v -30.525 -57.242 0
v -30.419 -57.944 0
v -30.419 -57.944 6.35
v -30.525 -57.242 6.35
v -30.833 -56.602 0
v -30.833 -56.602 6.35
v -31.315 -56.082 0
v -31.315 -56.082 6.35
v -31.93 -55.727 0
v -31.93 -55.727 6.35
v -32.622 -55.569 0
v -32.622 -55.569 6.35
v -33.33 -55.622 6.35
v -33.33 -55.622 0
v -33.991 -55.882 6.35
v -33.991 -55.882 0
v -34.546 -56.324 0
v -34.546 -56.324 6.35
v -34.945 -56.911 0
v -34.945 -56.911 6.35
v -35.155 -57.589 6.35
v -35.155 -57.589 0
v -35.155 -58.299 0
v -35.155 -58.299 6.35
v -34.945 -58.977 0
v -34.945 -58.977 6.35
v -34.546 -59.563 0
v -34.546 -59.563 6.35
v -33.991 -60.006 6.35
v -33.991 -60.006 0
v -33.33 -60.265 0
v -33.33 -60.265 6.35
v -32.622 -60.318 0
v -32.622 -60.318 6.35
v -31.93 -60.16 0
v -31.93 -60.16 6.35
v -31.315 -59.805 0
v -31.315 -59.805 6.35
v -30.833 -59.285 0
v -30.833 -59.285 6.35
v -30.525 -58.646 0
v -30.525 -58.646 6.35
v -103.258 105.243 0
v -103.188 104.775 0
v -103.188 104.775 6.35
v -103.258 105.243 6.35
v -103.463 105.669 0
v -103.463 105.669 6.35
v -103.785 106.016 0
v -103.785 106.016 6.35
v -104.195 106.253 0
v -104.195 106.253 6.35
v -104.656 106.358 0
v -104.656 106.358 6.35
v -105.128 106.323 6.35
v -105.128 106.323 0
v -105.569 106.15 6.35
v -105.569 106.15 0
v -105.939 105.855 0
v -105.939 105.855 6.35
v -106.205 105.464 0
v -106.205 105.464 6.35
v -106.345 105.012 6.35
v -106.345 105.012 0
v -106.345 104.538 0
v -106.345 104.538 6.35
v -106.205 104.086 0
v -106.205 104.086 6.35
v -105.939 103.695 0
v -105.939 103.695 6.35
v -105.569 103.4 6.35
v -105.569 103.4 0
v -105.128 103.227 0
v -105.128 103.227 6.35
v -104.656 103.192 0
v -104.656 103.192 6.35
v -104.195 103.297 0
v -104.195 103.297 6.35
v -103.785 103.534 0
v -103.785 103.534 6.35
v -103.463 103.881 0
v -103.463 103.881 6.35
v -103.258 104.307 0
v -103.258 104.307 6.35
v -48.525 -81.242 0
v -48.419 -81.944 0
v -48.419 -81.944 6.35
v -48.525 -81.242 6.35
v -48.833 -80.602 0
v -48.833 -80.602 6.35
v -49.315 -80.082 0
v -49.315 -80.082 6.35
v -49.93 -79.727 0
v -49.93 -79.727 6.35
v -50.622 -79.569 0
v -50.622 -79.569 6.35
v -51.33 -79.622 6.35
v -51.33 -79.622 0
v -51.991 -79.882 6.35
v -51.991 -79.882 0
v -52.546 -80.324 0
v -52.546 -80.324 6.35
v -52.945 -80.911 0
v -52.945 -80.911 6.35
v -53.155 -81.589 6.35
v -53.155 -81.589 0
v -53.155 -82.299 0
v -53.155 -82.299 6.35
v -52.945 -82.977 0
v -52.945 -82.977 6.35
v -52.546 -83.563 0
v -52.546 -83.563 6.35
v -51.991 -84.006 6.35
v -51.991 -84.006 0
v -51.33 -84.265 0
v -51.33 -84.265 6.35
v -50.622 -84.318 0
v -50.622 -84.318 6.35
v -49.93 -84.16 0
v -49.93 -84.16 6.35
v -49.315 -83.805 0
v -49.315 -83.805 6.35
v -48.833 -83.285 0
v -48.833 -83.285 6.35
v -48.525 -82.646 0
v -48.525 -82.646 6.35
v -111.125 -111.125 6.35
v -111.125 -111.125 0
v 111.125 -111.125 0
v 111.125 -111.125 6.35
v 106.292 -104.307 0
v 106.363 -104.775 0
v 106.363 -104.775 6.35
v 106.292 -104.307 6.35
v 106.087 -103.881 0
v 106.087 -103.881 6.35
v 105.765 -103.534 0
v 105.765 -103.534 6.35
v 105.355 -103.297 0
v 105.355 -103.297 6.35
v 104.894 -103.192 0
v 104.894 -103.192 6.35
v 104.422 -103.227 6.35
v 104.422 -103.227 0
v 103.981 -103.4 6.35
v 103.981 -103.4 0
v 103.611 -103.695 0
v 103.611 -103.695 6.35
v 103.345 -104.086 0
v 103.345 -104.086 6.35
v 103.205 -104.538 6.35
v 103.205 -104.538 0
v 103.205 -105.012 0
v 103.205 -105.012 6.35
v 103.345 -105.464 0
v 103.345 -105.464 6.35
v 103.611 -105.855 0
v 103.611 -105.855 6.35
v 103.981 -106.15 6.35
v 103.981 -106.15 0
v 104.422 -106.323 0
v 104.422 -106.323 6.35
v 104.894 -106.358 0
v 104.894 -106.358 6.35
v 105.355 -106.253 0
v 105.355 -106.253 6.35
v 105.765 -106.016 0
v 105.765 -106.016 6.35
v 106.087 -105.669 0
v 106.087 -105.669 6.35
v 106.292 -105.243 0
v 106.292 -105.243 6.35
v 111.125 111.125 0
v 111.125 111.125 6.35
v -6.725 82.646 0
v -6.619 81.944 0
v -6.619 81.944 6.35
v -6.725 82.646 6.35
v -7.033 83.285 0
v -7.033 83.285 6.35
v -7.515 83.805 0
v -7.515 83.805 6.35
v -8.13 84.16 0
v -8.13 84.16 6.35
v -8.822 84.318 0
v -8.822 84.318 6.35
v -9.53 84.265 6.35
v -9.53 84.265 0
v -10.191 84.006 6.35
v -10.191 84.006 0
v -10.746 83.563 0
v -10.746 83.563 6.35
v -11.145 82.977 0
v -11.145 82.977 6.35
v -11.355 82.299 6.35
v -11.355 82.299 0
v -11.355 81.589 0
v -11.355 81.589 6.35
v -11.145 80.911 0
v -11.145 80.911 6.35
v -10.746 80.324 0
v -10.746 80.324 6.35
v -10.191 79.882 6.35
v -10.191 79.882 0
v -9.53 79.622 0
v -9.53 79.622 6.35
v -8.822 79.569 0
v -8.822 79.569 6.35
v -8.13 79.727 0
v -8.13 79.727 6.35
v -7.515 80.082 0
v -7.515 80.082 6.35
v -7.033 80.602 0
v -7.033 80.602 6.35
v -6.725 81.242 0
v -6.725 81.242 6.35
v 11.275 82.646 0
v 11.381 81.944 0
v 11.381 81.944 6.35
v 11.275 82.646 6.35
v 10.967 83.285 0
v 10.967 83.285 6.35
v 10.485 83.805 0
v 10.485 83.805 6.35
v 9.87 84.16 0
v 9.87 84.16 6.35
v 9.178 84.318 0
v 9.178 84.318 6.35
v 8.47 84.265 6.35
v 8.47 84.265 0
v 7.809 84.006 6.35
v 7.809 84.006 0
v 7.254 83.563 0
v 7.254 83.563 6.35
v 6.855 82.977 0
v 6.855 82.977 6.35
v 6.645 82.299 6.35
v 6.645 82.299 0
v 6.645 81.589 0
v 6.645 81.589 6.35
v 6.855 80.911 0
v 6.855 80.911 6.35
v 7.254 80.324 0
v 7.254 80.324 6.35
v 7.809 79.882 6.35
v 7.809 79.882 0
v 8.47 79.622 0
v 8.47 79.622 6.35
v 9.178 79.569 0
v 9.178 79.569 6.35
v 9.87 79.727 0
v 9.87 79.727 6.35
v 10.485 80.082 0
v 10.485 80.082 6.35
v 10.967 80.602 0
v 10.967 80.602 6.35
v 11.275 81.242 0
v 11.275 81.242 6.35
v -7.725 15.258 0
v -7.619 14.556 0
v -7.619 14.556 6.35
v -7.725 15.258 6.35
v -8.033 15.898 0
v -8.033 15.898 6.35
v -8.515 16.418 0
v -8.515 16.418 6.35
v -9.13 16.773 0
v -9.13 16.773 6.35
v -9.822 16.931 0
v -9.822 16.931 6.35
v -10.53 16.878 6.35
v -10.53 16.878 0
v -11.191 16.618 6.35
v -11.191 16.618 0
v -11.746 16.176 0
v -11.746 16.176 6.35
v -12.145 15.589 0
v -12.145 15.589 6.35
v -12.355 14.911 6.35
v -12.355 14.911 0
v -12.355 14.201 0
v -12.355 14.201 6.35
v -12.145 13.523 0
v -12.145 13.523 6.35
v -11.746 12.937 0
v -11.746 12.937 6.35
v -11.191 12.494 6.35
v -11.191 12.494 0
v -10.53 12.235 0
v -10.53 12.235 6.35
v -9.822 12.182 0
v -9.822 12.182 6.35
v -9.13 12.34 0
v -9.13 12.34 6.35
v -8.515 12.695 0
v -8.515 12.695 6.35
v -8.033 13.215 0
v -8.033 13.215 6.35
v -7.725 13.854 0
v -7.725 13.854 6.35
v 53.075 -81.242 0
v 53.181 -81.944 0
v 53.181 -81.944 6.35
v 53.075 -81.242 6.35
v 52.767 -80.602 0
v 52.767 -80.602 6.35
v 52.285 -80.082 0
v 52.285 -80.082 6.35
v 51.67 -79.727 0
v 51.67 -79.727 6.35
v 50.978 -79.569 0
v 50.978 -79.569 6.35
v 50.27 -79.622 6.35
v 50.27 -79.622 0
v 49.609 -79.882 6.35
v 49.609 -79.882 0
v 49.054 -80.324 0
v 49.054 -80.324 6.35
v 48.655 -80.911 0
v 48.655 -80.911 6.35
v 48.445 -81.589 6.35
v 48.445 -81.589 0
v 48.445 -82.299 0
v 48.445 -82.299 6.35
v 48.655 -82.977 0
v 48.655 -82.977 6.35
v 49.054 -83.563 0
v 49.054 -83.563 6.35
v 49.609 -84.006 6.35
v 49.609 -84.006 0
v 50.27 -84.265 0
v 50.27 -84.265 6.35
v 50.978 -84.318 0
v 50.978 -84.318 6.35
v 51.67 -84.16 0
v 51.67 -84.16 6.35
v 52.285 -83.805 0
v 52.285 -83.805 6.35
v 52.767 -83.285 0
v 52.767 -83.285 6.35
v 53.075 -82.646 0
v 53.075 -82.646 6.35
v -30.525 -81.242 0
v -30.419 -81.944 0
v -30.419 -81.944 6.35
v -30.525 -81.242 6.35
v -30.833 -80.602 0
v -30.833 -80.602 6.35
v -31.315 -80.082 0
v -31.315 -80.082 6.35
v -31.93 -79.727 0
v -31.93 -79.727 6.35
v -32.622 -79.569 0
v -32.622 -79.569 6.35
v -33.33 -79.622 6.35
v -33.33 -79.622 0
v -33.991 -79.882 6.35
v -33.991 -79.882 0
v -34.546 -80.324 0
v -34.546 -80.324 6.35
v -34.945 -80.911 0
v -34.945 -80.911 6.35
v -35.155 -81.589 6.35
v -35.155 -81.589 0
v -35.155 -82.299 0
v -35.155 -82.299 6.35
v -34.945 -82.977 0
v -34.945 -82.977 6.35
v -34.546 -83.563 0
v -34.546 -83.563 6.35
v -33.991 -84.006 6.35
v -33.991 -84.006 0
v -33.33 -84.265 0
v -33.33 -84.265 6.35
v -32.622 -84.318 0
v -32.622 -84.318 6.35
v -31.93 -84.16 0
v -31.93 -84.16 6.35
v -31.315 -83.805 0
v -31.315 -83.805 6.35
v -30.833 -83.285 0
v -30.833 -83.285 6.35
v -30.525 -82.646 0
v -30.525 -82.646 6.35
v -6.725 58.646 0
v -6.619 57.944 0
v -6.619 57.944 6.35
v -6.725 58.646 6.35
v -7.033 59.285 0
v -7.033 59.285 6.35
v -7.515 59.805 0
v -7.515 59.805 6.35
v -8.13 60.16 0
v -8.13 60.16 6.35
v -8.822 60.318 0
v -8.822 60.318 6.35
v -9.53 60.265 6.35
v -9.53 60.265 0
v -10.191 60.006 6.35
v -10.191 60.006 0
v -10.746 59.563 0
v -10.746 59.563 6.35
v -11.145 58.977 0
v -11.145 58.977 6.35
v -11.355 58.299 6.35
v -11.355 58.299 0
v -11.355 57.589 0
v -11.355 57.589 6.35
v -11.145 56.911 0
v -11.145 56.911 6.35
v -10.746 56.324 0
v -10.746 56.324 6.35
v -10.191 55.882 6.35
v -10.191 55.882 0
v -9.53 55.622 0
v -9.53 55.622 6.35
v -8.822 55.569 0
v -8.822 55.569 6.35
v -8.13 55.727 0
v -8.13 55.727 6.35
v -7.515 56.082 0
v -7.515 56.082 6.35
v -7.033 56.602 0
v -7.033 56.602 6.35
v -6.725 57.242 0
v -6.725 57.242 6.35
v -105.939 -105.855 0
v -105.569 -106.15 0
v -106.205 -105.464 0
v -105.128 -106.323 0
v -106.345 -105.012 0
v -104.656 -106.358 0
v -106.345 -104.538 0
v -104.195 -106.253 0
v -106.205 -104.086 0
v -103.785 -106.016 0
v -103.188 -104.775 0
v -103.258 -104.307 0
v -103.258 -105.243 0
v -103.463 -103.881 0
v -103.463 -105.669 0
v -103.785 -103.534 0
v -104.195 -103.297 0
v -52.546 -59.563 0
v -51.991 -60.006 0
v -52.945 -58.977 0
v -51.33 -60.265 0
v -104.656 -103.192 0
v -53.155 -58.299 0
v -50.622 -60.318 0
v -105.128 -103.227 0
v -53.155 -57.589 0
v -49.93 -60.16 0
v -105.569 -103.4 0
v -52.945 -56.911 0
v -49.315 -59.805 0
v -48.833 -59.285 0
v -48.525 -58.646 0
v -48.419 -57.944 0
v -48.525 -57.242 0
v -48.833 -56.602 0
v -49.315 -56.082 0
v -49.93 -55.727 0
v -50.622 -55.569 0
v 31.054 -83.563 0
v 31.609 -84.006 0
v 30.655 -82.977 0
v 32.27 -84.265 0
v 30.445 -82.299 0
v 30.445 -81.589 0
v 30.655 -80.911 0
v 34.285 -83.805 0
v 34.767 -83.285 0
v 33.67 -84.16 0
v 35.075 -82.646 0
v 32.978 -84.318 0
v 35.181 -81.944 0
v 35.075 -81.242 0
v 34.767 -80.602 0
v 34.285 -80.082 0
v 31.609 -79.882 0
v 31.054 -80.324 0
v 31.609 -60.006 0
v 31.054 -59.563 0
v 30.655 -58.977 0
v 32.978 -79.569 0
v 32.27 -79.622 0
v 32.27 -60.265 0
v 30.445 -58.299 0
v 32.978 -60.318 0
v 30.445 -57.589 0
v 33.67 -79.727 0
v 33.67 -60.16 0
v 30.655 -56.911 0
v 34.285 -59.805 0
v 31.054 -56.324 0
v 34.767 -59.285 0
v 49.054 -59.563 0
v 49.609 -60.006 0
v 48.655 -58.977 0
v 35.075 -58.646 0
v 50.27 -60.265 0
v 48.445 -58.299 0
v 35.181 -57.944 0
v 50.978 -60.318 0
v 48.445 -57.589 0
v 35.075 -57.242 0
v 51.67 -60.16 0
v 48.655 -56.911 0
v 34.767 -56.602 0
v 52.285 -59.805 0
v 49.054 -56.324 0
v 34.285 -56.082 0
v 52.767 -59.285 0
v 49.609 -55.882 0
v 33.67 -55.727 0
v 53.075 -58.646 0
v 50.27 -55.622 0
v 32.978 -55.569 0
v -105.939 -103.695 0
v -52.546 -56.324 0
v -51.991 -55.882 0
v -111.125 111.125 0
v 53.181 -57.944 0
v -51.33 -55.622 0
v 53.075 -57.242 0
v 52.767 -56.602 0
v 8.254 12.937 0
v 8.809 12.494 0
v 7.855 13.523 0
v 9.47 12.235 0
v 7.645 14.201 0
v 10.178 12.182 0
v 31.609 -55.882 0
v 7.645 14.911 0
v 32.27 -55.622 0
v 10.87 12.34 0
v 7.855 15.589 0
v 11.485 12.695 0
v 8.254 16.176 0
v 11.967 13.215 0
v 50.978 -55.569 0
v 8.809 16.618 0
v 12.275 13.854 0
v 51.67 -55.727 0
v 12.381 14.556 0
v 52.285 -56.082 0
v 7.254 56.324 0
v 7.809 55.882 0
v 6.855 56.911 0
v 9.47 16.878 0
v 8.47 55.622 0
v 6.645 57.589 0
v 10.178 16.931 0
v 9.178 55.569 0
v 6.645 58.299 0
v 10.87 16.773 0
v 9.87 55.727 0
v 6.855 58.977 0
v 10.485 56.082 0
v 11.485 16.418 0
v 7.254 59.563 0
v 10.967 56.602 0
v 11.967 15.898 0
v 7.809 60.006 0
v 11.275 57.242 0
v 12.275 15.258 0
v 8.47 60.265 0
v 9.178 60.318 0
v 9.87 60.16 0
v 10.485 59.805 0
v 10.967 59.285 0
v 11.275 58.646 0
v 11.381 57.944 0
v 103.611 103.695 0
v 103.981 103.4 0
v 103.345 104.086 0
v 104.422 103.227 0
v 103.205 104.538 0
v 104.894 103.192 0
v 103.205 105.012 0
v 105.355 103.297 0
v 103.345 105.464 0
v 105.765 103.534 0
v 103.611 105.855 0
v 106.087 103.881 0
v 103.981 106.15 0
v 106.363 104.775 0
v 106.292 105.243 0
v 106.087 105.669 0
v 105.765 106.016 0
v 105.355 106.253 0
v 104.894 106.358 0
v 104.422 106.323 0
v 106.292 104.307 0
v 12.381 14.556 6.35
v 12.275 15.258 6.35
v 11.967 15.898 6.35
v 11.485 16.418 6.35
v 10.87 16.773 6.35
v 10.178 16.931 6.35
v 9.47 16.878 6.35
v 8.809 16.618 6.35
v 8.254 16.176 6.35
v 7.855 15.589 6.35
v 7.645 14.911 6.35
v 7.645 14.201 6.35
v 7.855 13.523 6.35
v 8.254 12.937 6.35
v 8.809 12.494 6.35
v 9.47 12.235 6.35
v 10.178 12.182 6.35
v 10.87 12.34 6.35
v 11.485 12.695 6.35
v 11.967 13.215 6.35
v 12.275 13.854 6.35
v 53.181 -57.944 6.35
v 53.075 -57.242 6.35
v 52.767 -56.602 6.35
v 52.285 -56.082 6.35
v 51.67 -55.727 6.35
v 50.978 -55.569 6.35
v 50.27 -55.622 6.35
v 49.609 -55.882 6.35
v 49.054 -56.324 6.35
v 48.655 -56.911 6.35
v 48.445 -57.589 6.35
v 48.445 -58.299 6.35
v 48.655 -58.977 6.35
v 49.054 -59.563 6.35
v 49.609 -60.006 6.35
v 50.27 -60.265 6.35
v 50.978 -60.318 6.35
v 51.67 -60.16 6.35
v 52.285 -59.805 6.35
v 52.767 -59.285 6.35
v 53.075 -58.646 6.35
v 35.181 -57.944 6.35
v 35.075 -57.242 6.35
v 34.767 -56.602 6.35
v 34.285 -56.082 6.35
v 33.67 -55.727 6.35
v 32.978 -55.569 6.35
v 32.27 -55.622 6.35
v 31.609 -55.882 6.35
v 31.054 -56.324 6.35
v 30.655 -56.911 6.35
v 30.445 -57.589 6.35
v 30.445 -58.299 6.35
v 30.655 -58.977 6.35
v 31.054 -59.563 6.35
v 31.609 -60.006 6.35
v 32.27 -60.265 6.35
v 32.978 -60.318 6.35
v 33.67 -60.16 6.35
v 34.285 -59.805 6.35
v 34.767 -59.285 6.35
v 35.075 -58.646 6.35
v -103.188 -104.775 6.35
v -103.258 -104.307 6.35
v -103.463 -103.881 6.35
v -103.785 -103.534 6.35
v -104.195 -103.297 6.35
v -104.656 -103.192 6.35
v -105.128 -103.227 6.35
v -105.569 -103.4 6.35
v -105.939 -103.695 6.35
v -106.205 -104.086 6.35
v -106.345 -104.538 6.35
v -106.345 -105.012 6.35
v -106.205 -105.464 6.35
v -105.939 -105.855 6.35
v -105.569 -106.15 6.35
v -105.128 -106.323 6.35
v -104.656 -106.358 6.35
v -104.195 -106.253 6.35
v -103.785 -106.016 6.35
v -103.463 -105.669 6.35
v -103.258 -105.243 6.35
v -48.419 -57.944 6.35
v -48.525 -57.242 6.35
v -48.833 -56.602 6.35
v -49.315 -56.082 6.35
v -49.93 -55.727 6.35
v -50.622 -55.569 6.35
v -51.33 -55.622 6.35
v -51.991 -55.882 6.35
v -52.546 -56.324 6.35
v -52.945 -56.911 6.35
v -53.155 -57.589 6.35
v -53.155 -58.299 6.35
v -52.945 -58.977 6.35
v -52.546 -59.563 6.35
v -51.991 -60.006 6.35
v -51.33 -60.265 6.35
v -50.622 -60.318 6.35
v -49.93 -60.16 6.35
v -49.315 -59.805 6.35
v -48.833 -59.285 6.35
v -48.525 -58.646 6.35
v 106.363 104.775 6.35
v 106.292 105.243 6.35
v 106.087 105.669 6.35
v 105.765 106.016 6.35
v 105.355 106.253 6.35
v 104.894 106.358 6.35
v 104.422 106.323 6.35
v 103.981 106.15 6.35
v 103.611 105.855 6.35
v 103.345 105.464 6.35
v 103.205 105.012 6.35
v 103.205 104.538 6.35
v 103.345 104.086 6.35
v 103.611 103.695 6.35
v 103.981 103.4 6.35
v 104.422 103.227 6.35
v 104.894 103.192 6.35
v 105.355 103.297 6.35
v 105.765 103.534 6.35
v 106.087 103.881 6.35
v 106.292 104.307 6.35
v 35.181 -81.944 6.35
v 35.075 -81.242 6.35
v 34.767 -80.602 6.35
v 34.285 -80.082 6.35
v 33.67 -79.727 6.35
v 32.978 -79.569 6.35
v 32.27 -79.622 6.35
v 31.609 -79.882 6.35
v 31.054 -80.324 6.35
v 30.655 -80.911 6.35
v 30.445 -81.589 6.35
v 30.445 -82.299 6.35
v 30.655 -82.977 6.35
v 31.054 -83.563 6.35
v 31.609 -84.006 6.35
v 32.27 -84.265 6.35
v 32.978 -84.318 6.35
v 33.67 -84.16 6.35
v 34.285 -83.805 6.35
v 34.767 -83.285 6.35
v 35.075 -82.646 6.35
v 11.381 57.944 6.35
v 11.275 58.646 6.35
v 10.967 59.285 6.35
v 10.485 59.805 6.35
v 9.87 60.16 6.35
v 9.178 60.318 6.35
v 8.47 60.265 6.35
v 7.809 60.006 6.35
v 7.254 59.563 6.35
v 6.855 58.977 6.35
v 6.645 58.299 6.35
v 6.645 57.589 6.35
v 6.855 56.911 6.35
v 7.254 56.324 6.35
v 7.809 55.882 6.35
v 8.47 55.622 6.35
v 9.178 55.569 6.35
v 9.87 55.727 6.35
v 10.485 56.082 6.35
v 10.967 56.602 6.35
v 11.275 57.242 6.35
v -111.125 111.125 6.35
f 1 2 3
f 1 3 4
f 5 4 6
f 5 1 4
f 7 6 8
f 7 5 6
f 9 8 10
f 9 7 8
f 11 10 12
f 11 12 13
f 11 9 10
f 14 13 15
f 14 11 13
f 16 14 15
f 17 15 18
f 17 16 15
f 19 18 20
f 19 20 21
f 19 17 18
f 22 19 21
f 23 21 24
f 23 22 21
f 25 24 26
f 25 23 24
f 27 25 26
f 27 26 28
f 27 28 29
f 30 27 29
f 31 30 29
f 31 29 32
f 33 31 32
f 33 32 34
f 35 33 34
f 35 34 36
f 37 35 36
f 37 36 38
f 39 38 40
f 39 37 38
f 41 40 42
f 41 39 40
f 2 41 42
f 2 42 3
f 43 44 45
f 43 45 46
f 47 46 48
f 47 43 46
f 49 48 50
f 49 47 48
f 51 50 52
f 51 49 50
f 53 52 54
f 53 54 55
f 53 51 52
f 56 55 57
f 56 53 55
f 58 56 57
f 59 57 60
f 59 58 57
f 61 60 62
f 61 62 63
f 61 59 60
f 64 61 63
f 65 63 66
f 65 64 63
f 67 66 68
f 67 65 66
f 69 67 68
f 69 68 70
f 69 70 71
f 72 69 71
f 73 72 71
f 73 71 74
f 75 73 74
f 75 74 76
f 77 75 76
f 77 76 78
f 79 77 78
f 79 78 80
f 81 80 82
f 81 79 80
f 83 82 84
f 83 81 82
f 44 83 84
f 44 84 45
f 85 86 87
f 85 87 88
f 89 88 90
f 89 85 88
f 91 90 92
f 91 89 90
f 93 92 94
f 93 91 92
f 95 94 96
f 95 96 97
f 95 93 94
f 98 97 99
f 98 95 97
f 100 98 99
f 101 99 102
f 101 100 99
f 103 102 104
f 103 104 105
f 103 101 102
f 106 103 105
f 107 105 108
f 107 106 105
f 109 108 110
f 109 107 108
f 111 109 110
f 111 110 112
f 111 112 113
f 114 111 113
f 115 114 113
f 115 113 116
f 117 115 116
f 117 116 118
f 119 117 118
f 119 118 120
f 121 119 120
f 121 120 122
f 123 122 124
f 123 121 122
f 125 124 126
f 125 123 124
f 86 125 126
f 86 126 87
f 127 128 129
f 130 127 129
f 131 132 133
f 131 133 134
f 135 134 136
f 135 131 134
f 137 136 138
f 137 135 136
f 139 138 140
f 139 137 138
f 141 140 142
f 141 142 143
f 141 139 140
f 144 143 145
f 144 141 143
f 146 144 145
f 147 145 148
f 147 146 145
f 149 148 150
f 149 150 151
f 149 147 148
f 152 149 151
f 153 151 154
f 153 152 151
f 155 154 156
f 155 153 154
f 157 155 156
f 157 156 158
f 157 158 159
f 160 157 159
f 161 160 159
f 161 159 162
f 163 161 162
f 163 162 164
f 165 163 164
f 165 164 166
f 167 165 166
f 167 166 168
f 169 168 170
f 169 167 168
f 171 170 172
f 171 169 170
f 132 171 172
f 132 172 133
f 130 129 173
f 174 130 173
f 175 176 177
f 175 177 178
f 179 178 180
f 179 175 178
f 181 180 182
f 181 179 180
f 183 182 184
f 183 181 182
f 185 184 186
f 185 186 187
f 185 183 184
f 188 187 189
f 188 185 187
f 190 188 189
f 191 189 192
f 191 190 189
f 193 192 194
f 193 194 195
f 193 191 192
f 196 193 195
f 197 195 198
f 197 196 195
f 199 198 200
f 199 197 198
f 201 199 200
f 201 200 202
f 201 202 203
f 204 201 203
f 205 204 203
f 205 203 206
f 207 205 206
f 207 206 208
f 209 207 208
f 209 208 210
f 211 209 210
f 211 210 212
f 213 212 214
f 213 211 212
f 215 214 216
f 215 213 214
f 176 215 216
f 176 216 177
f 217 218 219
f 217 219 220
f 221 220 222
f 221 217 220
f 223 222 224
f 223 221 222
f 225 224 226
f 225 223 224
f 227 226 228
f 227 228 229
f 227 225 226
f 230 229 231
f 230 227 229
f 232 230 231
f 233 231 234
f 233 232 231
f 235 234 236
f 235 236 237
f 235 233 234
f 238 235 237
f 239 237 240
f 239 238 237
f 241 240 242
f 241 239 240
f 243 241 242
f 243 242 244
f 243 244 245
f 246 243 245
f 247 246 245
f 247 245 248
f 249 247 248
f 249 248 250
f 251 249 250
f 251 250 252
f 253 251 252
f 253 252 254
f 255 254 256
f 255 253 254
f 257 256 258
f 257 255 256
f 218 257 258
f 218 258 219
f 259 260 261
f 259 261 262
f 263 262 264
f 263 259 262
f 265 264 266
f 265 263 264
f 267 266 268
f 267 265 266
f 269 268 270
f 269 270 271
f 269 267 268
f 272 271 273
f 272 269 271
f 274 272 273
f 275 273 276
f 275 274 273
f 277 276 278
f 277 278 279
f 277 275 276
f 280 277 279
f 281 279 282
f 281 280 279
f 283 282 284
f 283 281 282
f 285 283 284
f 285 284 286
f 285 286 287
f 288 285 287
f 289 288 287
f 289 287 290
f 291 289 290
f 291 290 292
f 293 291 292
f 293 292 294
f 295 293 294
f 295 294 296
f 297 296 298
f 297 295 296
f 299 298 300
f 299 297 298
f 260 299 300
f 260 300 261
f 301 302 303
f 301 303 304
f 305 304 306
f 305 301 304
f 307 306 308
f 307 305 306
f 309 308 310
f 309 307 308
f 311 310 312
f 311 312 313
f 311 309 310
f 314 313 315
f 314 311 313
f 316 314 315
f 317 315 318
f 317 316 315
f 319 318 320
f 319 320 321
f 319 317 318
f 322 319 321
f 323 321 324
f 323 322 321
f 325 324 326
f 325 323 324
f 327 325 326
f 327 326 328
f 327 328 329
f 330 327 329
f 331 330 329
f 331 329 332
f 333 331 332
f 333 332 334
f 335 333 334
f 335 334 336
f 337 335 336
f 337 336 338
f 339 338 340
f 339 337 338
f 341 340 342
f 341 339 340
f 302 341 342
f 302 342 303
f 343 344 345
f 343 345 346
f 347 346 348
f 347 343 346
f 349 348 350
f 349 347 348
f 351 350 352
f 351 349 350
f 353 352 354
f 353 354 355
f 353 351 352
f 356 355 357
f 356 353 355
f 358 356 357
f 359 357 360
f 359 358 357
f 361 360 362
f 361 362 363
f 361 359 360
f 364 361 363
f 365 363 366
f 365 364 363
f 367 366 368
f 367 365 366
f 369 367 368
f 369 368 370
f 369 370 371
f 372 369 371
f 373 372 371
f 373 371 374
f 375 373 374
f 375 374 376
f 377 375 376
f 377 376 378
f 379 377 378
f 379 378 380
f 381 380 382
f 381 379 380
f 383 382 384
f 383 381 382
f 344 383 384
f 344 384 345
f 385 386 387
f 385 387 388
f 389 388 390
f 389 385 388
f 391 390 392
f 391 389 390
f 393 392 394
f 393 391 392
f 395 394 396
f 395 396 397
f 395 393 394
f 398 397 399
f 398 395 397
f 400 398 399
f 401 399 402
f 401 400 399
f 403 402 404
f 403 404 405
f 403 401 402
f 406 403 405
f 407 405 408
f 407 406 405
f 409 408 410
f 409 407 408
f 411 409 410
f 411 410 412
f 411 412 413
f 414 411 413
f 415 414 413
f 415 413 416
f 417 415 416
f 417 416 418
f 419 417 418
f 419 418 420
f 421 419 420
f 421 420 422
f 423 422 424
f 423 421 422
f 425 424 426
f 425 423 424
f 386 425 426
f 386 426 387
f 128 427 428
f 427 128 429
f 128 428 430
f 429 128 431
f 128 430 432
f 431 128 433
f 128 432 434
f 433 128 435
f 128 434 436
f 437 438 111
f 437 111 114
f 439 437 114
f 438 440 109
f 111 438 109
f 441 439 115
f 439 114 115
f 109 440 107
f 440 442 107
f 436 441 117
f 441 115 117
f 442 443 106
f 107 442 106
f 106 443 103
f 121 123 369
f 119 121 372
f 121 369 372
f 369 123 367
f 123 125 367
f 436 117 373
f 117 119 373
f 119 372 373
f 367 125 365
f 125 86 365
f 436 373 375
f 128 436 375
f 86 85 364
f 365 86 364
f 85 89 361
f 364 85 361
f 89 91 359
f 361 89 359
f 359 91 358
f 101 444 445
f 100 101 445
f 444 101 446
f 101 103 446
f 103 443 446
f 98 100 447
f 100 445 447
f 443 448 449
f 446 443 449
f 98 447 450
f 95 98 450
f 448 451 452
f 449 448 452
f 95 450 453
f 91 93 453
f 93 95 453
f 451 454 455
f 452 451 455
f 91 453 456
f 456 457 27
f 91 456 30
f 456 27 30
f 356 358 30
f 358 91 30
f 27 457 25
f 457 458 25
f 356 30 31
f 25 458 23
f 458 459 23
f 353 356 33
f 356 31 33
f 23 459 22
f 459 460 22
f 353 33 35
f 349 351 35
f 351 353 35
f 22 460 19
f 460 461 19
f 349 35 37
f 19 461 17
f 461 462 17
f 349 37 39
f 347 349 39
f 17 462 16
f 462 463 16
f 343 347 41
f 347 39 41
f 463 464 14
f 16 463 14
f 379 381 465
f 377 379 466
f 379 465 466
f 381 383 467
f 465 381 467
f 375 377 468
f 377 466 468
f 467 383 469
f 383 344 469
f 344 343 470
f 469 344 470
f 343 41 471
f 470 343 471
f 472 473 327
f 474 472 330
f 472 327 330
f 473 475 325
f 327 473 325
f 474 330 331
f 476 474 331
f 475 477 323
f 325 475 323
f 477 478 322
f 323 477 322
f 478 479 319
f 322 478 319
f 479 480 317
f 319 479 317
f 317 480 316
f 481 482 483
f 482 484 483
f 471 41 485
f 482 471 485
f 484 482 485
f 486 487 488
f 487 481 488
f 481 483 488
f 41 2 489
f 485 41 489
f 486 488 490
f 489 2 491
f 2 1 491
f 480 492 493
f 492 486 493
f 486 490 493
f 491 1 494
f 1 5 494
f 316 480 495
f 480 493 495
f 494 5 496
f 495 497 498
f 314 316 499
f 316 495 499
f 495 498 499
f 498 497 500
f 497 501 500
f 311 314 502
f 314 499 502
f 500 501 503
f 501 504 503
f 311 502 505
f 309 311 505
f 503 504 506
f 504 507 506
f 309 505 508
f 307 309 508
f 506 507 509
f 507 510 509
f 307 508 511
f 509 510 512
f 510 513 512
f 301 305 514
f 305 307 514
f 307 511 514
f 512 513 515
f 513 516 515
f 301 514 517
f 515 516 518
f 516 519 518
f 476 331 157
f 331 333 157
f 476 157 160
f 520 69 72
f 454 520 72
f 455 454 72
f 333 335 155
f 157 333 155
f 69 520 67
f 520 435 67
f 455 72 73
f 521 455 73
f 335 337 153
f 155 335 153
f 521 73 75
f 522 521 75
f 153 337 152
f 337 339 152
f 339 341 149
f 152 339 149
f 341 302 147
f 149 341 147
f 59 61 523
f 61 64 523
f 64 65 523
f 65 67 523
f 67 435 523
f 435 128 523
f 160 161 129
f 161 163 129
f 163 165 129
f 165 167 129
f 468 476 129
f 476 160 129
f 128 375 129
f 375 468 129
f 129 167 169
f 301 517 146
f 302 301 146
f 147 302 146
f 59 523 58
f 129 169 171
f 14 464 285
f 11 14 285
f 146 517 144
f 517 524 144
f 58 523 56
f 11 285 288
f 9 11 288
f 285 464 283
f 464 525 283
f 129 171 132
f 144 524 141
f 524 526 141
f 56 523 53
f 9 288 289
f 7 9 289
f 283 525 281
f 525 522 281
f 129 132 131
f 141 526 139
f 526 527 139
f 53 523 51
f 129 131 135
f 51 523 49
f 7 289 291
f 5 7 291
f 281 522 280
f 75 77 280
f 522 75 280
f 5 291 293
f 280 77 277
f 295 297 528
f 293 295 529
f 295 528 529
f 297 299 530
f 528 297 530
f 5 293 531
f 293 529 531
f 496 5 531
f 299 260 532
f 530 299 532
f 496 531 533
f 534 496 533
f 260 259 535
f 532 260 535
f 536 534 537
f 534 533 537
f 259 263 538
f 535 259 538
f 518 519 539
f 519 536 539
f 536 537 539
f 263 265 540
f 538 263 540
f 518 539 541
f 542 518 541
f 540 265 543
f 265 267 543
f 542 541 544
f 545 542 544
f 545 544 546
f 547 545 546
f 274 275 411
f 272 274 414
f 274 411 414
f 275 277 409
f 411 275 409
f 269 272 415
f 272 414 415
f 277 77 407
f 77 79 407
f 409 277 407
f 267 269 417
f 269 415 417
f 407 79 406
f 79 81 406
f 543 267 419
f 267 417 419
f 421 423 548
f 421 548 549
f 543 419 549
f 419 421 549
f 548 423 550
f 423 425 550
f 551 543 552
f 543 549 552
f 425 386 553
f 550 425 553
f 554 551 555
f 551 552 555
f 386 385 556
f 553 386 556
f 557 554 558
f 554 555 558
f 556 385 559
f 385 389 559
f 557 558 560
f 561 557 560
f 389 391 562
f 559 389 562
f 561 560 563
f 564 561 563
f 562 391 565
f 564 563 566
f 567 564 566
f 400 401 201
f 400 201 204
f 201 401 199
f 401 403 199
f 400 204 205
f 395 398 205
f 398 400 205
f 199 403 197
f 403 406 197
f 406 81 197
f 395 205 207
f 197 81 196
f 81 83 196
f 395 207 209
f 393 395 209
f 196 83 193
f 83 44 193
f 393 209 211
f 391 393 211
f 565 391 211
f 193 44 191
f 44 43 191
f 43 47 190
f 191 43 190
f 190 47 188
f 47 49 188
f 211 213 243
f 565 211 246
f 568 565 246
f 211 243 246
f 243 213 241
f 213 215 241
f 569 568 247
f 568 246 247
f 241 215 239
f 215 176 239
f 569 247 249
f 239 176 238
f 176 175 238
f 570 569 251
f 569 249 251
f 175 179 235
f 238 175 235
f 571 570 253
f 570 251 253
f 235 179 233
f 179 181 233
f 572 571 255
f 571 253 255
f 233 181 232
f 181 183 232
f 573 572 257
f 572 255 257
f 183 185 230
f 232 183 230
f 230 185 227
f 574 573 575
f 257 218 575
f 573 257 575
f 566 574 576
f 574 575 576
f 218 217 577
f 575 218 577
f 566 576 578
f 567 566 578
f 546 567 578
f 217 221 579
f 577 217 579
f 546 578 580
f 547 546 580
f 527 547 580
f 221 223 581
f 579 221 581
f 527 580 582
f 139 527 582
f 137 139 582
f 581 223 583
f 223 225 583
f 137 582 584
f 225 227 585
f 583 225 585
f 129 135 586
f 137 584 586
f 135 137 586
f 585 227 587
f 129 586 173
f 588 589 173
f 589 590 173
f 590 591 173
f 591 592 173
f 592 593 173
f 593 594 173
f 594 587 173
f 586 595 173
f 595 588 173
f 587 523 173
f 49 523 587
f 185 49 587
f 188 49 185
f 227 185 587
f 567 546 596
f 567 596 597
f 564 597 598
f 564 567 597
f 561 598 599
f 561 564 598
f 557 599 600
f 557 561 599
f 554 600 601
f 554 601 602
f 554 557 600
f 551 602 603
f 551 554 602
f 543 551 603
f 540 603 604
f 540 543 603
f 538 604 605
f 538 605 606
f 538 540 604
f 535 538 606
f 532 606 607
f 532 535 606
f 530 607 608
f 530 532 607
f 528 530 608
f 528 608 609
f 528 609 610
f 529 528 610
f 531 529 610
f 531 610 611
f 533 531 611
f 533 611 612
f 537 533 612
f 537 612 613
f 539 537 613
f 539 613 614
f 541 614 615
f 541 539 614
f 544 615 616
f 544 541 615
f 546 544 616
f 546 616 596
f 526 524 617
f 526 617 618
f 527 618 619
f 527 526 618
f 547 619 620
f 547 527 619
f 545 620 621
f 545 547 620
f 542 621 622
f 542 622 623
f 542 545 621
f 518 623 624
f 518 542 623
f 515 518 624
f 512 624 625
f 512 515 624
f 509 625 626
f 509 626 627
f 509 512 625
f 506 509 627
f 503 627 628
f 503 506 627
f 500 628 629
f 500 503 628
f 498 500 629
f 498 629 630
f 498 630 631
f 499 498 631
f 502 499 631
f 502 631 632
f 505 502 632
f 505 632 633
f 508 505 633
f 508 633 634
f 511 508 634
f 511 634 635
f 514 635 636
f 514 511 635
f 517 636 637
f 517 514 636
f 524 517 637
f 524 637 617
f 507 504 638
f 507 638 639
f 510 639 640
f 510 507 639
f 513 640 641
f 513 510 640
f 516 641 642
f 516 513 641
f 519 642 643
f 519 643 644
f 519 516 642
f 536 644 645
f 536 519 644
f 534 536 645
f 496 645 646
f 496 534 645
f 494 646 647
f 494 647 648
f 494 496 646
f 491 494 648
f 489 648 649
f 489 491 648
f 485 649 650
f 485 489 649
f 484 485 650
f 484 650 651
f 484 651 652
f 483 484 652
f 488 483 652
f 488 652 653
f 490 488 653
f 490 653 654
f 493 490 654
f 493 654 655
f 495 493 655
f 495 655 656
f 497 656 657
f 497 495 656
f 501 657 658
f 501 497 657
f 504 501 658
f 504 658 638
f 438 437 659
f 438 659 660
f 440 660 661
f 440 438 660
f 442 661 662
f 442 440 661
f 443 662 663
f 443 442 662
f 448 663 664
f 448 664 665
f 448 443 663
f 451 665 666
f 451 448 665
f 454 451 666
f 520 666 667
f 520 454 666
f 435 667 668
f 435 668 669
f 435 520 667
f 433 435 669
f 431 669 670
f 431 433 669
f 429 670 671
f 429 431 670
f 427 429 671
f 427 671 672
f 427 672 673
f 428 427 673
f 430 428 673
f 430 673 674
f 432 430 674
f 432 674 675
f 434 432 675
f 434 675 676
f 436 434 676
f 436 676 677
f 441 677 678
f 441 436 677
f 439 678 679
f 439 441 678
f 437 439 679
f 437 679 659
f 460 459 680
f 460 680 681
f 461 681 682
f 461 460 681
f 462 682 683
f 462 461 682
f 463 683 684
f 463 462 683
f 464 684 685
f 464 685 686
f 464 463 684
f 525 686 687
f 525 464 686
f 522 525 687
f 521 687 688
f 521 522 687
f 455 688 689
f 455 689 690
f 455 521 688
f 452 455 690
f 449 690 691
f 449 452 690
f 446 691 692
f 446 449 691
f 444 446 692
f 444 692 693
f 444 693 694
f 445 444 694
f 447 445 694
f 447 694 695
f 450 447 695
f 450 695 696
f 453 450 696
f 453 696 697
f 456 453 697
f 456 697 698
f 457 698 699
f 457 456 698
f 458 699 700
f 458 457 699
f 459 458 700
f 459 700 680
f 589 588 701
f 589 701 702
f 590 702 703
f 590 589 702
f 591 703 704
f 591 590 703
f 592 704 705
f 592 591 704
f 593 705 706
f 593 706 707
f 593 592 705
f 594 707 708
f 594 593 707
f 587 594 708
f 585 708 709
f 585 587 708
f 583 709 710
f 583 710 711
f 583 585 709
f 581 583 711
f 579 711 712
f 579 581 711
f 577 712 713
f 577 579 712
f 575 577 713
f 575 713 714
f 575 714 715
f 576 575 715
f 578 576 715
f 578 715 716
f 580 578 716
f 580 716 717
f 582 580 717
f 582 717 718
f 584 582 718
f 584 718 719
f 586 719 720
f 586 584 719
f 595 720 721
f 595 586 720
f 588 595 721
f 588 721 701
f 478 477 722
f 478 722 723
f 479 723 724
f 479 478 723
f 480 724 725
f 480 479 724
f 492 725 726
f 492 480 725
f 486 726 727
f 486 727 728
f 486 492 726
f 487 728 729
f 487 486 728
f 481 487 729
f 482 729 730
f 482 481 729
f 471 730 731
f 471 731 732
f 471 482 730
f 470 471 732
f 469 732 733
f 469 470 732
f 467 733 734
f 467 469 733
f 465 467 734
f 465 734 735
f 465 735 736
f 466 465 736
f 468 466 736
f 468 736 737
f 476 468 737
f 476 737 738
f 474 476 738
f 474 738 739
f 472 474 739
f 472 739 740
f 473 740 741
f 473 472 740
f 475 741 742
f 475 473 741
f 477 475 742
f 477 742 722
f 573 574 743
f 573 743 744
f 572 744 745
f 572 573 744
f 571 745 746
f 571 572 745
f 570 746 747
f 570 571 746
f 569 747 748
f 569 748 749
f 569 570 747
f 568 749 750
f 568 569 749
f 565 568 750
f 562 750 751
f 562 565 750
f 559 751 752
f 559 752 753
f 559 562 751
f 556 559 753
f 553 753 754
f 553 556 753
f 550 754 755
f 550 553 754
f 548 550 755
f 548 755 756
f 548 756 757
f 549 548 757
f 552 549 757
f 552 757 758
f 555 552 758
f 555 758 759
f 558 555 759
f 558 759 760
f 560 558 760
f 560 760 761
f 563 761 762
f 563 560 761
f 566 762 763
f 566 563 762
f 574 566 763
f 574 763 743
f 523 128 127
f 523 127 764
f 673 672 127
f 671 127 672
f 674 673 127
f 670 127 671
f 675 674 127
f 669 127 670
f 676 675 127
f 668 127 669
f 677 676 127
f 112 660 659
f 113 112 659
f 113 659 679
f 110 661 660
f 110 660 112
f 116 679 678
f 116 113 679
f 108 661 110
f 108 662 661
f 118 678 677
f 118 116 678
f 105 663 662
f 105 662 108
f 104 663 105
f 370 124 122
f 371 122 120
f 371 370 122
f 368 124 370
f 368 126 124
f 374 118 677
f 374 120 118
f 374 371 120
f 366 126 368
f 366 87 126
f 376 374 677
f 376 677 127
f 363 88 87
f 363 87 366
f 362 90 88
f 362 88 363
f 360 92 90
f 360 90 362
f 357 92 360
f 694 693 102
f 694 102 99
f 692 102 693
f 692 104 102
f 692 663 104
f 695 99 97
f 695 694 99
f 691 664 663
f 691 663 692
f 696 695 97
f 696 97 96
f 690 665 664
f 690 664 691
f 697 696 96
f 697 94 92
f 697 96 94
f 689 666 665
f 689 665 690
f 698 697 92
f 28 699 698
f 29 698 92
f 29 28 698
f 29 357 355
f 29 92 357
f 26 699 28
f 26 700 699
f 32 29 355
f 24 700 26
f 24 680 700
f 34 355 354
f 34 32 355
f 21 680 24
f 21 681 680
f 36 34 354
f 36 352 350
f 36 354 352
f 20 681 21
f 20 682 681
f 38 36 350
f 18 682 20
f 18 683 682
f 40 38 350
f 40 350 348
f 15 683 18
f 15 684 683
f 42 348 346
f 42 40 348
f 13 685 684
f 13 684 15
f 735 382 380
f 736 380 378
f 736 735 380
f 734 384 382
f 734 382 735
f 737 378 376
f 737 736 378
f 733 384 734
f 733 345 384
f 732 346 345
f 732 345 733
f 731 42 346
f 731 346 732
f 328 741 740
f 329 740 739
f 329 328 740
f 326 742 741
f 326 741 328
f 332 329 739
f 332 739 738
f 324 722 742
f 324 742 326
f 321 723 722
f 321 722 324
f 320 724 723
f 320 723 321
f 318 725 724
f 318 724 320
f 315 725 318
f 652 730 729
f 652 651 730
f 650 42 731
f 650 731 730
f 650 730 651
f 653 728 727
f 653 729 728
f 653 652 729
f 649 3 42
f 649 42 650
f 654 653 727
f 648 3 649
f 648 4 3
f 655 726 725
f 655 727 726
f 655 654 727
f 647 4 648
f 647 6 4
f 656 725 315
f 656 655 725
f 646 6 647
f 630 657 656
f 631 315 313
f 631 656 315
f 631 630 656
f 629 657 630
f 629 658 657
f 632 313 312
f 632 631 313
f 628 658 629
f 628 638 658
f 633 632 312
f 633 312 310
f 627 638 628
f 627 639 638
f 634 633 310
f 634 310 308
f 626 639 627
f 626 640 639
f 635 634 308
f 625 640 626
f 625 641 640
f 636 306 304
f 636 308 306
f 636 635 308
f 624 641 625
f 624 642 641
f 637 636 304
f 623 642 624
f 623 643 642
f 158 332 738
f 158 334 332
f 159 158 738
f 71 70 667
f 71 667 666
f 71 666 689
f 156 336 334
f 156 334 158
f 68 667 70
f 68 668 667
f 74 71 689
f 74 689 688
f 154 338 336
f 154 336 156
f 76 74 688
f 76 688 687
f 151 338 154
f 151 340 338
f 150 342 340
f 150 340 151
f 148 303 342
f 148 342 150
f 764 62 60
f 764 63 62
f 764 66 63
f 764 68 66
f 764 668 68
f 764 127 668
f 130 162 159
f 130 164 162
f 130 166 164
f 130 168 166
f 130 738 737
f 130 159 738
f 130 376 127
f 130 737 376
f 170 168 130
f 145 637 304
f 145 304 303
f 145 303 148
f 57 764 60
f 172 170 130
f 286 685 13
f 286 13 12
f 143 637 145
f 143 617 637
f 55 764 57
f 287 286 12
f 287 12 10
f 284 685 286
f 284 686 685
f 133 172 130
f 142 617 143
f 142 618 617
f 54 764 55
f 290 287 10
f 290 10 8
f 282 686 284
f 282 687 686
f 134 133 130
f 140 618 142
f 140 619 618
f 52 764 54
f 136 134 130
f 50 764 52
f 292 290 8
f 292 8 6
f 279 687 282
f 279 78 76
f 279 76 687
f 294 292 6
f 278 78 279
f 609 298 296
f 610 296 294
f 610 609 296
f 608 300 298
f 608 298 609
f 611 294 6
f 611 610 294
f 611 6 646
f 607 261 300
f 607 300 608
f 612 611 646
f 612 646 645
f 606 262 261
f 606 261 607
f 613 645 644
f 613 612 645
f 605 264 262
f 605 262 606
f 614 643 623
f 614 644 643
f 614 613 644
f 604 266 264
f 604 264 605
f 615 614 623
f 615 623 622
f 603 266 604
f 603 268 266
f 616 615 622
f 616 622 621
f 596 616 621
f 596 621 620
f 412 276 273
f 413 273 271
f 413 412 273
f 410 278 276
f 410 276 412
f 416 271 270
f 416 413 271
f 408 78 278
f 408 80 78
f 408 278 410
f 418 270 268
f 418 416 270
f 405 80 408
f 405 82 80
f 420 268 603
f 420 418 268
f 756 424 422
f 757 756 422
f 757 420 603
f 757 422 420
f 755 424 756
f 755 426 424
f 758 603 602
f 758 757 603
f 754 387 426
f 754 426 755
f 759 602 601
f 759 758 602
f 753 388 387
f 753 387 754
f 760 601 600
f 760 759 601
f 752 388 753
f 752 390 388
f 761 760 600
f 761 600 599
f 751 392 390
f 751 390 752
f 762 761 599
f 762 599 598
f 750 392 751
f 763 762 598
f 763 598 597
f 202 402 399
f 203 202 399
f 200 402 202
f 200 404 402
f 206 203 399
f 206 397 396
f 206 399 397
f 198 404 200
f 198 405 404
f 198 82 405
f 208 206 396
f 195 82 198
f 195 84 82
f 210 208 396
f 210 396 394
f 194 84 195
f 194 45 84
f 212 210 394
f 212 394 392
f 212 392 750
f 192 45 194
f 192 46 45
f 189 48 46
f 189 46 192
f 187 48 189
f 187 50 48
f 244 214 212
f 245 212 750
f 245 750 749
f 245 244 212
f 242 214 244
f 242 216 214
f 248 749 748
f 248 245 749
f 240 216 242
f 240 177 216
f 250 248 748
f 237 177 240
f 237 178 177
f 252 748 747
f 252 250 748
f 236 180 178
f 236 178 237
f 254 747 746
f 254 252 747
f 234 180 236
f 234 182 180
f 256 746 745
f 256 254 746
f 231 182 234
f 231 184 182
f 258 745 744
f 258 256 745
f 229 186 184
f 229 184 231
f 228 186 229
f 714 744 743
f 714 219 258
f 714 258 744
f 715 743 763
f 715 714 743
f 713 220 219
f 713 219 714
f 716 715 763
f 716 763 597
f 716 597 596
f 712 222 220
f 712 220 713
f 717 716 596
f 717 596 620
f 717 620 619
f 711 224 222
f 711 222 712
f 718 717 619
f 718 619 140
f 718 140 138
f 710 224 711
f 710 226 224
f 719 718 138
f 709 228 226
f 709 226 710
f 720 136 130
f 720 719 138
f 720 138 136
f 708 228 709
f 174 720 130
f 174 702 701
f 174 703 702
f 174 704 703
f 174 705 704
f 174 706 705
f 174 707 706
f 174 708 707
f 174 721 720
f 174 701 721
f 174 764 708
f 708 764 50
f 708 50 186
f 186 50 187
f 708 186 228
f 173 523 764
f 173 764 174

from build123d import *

# Parameters (mm, degrees)
F0_W     = 222.25
F0_H     = 222.25
F0_R     = 1.5875
F0_R_2   = 2.38125
F1_DEPTH = 6.35


with BuildPart() as f1:
    # F0 (on Top) → F1 (new body)
    with BuildSketch(Plane.XY):
        Rectangle(F0_W, F0_H)
        with Locations((-104.775, -104.775)):
            Circle(F0_R, mode=Mode.SUBTRACT)
        with Locations((-50.8, -81.94375)):
            Circle(F0_R_2, mode=Mode.SUBTRACT)
        with Locations((-32.8, -81.94375)):
            Circle(F0_R_2, mode=Mode.SUBTRACT)
        with Locations((-50.8, -57.94375)):
            Circle(F0_R_2, mode=Mode.SUBTRACT)
        with Locations((-32.8, -57.94375)):
            Circle(F0_R_2, mode=Mode.SUBTRACT)
        with Locations((32.8, -81.94375)):
            Circle(F0_R_2, mode=Mode.SUBTRACT)
        with Locations((50.8, -81.94375)):
            Circle(F0_R_2, mode=Mode.SUBTRACT)
        with Locations((32.8, -57.94375)):
            Circle(F0_R_2, mode=Mode.SUBTRACT)
        with Locations((50.8, -57.94375)):
            Circle(F0_R_2, mode=Mode.SUBTRACT)
        with Locations((104.775, -104.775)):
            Circle(F0_R, mode=Mode.SUBTRACT)
        with Locations((-10, 14.55625)):
            Circle(F0_R_2, mode=Mode.SUBTRACT)
        with Locations((-104.775, 104.775)):
            Circle(F0_R, mode=Mode.SUBTRACT)
        with Locations((-9, 57.94375)):
            Circle(F0_R_2, mode=Mode.SUBTRACT)
        with Locations((-9, 81.94375)):
            Circle(F0_R_2, mode=Mode.SUBTRACT)
        with Locations((10, 14.55625)):
            Circle(F0_R_2, mode=Mode.SUBTRACT)
        with Locations((9, 57.94375)):
            Circle(F0_R_2, mode=Mode.SUBTRACT)
        with Locations((9, 81.94375)):
            Circle(F0_R_2, mode=Mode.SUBTRACT)
        with Locations((104.775, 104.775)):
            Circle(F0_R, mode=Mode.SUBTRACT)
    extrude(amount=F1_DEPTH)


solid = f1.part
